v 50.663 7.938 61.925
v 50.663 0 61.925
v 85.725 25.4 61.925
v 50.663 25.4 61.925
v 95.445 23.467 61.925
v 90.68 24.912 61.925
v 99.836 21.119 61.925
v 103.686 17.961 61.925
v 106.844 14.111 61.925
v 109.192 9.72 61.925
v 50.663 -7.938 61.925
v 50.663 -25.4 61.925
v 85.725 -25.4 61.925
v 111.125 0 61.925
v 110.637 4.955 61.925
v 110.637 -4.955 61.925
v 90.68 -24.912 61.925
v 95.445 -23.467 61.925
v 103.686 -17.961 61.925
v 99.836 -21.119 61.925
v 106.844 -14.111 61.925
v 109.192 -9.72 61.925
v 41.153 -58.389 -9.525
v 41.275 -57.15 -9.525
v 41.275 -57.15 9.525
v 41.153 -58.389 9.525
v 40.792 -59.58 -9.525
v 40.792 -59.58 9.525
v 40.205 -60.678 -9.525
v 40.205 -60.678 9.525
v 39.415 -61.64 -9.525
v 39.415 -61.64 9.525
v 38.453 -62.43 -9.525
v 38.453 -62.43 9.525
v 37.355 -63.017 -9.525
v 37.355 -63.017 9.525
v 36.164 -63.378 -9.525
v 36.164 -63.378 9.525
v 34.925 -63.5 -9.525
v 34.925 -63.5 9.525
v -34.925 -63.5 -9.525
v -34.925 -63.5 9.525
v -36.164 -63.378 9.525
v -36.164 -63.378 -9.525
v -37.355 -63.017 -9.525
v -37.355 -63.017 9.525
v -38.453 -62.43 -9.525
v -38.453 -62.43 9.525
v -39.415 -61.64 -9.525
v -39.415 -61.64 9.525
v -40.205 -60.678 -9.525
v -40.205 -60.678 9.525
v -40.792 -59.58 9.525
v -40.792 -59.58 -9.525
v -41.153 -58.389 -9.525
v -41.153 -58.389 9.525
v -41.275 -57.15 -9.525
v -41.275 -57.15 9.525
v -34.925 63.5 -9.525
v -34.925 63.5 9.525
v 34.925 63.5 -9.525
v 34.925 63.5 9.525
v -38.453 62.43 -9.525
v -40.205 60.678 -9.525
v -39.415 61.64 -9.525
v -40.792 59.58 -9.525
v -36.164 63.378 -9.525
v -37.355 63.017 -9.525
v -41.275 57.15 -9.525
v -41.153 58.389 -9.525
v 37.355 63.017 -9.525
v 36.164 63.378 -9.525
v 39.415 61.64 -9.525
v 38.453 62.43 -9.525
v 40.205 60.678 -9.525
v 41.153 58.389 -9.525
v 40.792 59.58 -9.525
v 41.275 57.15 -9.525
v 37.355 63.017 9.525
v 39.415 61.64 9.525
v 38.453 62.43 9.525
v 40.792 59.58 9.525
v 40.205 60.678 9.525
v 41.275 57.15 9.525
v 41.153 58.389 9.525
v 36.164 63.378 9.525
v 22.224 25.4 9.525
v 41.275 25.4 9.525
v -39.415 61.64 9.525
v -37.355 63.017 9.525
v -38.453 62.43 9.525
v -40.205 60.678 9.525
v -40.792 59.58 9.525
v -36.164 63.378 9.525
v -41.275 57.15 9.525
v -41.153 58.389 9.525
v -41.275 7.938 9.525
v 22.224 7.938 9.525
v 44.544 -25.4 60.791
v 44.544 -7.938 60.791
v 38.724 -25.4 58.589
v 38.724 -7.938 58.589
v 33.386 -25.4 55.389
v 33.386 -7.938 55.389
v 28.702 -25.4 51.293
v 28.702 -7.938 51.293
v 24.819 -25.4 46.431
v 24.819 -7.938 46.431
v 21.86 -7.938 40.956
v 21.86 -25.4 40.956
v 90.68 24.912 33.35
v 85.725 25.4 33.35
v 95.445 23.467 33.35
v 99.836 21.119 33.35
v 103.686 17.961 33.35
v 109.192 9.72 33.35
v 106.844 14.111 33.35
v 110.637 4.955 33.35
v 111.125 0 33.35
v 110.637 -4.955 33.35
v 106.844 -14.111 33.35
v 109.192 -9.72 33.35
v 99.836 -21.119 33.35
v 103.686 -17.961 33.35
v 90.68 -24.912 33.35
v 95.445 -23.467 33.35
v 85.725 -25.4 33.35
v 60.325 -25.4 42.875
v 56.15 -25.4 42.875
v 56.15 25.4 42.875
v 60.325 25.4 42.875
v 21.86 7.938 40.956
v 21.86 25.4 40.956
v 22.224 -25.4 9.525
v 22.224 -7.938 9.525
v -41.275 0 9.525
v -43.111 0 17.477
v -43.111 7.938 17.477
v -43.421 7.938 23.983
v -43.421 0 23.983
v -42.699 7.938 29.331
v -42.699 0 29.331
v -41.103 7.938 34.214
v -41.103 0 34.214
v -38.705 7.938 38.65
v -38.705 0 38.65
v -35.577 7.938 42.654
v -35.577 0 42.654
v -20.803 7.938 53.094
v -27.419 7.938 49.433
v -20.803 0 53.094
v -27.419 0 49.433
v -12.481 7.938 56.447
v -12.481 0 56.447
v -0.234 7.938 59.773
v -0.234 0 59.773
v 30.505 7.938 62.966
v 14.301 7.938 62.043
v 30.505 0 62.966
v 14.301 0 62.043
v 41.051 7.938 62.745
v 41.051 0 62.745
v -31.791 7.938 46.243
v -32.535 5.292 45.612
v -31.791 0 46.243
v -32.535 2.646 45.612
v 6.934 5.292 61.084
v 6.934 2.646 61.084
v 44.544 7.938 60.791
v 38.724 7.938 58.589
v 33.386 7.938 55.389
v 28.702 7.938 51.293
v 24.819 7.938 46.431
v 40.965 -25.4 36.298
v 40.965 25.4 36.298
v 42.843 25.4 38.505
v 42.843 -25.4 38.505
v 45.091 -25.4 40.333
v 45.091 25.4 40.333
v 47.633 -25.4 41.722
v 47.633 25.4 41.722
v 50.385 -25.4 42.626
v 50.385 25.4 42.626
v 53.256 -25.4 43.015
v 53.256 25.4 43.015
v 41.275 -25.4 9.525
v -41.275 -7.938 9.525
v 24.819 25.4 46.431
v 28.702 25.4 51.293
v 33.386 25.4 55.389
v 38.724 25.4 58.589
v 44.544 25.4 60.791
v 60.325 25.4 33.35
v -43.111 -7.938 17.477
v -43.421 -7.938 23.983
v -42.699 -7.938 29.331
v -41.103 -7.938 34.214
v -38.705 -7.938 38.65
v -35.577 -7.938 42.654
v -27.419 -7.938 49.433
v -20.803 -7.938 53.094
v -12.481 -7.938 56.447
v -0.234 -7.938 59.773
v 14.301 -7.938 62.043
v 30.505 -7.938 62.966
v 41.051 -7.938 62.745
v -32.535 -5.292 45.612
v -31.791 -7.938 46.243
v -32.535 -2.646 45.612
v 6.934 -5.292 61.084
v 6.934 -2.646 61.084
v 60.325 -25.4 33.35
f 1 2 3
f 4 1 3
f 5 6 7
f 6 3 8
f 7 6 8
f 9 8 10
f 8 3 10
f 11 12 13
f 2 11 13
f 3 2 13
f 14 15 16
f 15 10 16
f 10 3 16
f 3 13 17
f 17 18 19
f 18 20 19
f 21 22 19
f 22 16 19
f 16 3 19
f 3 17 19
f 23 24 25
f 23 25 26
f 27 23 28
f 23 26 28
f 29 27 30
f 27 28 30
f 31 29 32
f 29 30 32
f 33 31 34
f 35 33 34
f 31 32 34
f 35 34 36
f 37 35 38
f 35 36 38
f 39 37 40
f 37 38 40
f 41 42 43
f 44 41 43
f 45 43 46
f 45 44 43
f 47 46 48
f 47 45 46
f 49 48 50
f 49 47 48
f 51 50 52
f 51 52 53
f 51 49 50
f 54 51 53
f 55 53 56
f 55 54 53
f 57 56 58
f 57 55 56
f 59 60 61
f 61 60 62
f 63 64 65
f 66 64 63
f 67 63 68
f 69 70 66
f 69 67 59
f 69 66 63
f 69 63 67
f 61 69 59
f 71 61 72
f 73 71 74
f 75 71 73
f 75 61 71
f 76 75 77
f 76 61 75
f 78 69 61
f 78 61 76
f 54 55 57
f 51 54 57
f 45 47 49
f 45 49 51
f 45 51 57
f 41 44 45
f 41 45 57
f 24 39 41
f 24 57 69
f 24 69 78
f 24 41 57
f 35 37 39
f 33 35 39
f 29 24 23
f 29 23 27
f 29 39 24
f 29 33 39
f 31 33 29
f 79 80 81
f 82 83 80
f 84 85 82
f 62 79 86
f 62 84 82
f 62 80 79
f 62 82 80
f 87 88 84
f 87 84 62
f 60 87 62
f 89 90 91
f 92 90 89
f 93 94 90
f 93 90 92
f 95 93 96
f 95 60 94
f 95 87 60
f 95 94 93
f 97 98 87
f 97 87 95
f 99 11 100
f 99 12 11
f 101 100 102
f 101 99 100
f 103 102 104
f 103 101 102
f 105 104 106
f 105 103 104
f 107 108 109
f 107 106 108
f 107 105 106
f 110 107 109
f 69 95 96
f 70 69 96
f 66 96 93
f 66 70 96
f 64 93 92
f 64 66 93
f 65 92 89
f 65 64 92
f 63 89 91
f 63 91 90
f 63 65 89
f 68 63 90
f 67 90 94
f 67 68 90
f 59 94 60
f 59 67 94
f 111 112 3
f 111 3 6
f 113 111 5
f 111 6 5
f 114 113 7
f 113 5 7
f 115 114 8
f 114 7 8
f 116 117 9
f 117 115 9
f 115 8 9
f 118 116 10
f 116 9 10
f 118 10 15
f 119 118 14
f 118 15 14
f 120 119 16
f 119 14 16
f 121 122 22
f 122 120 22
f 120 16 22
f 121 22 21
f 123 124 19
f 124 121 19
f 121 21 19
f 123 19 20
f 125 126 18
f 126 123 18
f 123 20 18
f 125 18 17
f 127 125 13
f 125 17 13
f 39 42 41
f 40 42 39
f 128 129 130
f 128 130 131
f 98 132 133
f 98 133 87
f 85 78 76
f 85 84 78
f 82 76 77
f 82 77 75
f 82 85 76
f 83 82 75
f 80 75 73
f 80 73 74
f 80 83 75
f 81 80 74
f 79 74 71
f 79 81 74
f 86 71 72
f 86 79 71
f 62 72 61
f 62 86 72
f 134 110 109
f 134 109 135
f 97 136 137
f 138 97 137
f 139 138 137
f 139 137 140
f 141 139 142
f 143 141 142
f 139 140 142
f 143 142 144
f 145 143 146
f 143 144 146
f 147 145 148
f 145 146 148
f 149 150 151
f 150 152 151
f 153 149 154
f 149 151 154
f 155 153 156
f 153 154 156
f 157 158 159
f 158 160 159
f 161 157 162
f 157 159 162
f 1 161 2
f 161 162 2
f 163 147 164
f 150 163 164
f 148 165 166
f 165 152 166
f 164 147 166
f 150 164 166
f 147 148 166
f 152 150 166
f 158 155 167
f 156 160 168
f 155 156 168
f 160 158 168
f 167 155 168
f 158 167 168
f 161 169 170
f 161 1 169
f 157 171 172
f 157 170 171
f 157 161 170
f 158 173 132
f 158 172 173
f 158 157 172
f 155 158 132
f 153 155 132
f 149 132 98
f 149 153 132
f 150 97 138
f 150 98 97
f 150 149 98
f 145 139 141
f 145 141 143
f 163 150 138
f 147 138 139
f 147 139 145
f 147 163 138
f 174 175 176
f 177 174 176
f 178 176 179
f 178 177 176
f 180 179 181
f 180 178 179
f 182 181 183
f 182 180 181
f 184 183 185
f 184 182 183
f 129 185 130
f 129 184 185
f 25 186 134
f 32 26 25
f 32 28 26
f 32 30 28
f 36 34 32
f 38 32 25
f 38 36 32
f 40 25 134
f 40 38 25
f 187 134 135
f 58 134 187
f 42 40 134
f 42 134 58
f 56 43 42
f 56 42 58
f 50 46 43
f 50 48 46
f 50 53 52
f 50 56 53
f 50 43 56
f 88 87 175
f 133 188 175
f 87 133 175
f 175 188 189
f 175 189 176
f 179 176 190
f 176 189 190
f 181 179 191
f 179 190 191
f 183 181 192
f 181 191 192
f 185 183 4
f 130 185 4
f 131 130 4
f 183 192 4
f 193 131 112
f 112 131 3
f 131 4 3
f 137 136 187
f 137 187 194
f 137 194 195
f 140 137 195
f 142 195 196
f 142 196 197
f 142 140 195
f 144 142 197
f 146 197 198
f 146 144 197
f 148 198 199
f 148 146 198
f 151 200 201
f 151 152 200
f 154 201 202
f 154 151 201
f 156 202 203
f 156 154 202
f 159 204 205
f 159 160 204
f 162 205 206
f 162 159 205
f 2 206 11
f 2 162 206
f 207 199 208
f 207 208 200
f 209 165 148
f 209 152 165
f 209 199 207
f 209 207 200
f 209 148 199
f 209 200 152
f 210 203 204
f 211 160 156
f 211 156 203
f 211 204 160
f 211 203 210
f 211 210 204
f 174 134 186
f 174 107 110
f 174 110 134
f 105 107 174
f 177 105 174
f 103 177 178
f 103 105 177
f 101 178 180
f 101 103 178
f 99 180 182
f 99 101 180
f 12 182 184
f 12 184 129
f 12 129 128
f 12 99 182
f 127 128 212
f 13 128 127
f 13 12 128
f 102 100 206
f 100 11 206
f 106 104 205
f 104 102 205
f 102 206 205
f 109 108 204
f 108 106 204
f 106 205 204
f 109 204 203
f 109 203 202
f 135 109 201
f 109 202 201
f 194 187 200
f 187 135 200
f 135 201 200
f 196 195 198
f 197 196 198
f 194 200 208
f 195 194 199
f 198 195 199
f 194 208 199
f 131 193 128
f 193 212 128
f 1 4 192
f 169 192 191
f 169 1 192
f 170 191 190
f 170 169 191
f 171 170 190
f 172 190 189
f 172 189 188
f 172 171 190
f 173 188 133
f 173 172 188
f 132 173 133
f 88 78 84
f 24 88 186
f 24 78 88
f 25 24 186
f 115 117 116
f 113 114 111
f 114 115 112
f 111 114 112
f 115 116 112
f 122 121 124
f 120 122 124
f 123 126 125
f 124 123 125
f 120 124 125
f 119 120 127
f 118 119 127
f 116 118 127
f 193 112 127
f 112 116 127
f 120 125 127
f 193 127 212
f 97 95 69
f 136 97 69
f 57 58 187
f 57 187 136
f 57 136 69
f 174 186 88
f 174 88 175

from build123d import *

# Parameters (mm, degrees)
F1_DEPTH = 63.5
F0_W     = 25.4
F0_H     = 19.05
F0_H_2   = 9.525
F2_DEPTH = 25.4
F3_DEPTH = 7.9375
F5_R     = 6.35


with BuildPart() as f1:
    # F0 (on Front) → F1 (new body, symmetric)
    with BuildSketch(Plane.XZ):
        Polygon((-41.275, -9.525), (41.275, -9.525), (41.275, 9.525), (22.2237235206, 9.525), (-41.275, 9.525), align=None)
    extrude(amount=F1_DEPTH, both=True)

    # F0 (on Front) → F2 (join, symmetric)
    with BuildSketch(Plane.XZ):
        with BuildLine():
            Line((22.2237235206, 9.525), (41.275, 9.525))
            Line((41.275, 9.525), (40.9650549741, 36.2983668991))
            ThreePointArc((40.9650549741, 36.2983668991), (47.6329246689, 41.7219107909), (56.1502739404, 42.8752))
            Line((56.1502739404, 42.8752), (60.325, 42.8752))
            Line((60.325, 42.8752), (60.325, 61.9252))
            Line((60.325, 61.9252), (50.6626719245, 61.9252))
            ThreePointArc((50.6626719245, 61.9252), (33.3863605767, 55.3894970066), (21.8598589674, 40.95599057))
            Line((21.8598589674, 40.95599057), (22.2237235206, 9.525))
        make_face()
        with Locations((73.025, 52.4002)):
            Rectangle(F0_W, F0_H)
        with Locations((73.025, 38.1127)):
            Rectangle(F0_W, F0_H_2)
    extrude(amount=F2_DEPTH, both=True)

    # F0 (on Front) → F3 (join, symmetric)
    with BuildSketch(Plane.XZ):
        with BuildLine():
            add(Edge.make_bspline(
                [(-41.275, 9.525), (-56.7215932498, 57.9155711565), (13.6268828042, 66.4033379321), (50.6626719245, 61.9252)],
                knots=[0, 0, 0, 0, 105.8220982543, 105.8220982543, 105.8220982543, 105.8220982543], degree=3))
            Line((-41.275, 9.525), (22.2237235206, 9.525))
            Line((22.2237235206, 9.525), (21.8598589674, 40.95599057))
            ThreePointArc((21.8598589674, 40.95599057), (33.3863605767, 55.3894970066), (50.6626719245, 61.9252))
        make_face()
    extrude(amount=F3_DEPTH, both=True)

    # F0 (on Front) → F4 (revolve)
    with BuildSketch(Plane.XZ):
        Polygon((111.125, 61.9252), (85.725, 61.9252), (85.725, 42.8752), (85.725, 33.3502), (111.125, 33.3502), align=None)
    revolve(axis=Axis((85.725, 0, 52.4002), (0, 0, -1)))

    # F5
    f5_edges = [f1.edges().sort_by_distance(p)[0] for p in [
        (41.275, 63.5, 0),
        (-41.275, 63.5, 0),
        (-41.275, -63.5, 0),
        (41.275, -63.5, 0),
    ]]
    fillet(f5_edges, radius=F5_R)


solid = f1.part
